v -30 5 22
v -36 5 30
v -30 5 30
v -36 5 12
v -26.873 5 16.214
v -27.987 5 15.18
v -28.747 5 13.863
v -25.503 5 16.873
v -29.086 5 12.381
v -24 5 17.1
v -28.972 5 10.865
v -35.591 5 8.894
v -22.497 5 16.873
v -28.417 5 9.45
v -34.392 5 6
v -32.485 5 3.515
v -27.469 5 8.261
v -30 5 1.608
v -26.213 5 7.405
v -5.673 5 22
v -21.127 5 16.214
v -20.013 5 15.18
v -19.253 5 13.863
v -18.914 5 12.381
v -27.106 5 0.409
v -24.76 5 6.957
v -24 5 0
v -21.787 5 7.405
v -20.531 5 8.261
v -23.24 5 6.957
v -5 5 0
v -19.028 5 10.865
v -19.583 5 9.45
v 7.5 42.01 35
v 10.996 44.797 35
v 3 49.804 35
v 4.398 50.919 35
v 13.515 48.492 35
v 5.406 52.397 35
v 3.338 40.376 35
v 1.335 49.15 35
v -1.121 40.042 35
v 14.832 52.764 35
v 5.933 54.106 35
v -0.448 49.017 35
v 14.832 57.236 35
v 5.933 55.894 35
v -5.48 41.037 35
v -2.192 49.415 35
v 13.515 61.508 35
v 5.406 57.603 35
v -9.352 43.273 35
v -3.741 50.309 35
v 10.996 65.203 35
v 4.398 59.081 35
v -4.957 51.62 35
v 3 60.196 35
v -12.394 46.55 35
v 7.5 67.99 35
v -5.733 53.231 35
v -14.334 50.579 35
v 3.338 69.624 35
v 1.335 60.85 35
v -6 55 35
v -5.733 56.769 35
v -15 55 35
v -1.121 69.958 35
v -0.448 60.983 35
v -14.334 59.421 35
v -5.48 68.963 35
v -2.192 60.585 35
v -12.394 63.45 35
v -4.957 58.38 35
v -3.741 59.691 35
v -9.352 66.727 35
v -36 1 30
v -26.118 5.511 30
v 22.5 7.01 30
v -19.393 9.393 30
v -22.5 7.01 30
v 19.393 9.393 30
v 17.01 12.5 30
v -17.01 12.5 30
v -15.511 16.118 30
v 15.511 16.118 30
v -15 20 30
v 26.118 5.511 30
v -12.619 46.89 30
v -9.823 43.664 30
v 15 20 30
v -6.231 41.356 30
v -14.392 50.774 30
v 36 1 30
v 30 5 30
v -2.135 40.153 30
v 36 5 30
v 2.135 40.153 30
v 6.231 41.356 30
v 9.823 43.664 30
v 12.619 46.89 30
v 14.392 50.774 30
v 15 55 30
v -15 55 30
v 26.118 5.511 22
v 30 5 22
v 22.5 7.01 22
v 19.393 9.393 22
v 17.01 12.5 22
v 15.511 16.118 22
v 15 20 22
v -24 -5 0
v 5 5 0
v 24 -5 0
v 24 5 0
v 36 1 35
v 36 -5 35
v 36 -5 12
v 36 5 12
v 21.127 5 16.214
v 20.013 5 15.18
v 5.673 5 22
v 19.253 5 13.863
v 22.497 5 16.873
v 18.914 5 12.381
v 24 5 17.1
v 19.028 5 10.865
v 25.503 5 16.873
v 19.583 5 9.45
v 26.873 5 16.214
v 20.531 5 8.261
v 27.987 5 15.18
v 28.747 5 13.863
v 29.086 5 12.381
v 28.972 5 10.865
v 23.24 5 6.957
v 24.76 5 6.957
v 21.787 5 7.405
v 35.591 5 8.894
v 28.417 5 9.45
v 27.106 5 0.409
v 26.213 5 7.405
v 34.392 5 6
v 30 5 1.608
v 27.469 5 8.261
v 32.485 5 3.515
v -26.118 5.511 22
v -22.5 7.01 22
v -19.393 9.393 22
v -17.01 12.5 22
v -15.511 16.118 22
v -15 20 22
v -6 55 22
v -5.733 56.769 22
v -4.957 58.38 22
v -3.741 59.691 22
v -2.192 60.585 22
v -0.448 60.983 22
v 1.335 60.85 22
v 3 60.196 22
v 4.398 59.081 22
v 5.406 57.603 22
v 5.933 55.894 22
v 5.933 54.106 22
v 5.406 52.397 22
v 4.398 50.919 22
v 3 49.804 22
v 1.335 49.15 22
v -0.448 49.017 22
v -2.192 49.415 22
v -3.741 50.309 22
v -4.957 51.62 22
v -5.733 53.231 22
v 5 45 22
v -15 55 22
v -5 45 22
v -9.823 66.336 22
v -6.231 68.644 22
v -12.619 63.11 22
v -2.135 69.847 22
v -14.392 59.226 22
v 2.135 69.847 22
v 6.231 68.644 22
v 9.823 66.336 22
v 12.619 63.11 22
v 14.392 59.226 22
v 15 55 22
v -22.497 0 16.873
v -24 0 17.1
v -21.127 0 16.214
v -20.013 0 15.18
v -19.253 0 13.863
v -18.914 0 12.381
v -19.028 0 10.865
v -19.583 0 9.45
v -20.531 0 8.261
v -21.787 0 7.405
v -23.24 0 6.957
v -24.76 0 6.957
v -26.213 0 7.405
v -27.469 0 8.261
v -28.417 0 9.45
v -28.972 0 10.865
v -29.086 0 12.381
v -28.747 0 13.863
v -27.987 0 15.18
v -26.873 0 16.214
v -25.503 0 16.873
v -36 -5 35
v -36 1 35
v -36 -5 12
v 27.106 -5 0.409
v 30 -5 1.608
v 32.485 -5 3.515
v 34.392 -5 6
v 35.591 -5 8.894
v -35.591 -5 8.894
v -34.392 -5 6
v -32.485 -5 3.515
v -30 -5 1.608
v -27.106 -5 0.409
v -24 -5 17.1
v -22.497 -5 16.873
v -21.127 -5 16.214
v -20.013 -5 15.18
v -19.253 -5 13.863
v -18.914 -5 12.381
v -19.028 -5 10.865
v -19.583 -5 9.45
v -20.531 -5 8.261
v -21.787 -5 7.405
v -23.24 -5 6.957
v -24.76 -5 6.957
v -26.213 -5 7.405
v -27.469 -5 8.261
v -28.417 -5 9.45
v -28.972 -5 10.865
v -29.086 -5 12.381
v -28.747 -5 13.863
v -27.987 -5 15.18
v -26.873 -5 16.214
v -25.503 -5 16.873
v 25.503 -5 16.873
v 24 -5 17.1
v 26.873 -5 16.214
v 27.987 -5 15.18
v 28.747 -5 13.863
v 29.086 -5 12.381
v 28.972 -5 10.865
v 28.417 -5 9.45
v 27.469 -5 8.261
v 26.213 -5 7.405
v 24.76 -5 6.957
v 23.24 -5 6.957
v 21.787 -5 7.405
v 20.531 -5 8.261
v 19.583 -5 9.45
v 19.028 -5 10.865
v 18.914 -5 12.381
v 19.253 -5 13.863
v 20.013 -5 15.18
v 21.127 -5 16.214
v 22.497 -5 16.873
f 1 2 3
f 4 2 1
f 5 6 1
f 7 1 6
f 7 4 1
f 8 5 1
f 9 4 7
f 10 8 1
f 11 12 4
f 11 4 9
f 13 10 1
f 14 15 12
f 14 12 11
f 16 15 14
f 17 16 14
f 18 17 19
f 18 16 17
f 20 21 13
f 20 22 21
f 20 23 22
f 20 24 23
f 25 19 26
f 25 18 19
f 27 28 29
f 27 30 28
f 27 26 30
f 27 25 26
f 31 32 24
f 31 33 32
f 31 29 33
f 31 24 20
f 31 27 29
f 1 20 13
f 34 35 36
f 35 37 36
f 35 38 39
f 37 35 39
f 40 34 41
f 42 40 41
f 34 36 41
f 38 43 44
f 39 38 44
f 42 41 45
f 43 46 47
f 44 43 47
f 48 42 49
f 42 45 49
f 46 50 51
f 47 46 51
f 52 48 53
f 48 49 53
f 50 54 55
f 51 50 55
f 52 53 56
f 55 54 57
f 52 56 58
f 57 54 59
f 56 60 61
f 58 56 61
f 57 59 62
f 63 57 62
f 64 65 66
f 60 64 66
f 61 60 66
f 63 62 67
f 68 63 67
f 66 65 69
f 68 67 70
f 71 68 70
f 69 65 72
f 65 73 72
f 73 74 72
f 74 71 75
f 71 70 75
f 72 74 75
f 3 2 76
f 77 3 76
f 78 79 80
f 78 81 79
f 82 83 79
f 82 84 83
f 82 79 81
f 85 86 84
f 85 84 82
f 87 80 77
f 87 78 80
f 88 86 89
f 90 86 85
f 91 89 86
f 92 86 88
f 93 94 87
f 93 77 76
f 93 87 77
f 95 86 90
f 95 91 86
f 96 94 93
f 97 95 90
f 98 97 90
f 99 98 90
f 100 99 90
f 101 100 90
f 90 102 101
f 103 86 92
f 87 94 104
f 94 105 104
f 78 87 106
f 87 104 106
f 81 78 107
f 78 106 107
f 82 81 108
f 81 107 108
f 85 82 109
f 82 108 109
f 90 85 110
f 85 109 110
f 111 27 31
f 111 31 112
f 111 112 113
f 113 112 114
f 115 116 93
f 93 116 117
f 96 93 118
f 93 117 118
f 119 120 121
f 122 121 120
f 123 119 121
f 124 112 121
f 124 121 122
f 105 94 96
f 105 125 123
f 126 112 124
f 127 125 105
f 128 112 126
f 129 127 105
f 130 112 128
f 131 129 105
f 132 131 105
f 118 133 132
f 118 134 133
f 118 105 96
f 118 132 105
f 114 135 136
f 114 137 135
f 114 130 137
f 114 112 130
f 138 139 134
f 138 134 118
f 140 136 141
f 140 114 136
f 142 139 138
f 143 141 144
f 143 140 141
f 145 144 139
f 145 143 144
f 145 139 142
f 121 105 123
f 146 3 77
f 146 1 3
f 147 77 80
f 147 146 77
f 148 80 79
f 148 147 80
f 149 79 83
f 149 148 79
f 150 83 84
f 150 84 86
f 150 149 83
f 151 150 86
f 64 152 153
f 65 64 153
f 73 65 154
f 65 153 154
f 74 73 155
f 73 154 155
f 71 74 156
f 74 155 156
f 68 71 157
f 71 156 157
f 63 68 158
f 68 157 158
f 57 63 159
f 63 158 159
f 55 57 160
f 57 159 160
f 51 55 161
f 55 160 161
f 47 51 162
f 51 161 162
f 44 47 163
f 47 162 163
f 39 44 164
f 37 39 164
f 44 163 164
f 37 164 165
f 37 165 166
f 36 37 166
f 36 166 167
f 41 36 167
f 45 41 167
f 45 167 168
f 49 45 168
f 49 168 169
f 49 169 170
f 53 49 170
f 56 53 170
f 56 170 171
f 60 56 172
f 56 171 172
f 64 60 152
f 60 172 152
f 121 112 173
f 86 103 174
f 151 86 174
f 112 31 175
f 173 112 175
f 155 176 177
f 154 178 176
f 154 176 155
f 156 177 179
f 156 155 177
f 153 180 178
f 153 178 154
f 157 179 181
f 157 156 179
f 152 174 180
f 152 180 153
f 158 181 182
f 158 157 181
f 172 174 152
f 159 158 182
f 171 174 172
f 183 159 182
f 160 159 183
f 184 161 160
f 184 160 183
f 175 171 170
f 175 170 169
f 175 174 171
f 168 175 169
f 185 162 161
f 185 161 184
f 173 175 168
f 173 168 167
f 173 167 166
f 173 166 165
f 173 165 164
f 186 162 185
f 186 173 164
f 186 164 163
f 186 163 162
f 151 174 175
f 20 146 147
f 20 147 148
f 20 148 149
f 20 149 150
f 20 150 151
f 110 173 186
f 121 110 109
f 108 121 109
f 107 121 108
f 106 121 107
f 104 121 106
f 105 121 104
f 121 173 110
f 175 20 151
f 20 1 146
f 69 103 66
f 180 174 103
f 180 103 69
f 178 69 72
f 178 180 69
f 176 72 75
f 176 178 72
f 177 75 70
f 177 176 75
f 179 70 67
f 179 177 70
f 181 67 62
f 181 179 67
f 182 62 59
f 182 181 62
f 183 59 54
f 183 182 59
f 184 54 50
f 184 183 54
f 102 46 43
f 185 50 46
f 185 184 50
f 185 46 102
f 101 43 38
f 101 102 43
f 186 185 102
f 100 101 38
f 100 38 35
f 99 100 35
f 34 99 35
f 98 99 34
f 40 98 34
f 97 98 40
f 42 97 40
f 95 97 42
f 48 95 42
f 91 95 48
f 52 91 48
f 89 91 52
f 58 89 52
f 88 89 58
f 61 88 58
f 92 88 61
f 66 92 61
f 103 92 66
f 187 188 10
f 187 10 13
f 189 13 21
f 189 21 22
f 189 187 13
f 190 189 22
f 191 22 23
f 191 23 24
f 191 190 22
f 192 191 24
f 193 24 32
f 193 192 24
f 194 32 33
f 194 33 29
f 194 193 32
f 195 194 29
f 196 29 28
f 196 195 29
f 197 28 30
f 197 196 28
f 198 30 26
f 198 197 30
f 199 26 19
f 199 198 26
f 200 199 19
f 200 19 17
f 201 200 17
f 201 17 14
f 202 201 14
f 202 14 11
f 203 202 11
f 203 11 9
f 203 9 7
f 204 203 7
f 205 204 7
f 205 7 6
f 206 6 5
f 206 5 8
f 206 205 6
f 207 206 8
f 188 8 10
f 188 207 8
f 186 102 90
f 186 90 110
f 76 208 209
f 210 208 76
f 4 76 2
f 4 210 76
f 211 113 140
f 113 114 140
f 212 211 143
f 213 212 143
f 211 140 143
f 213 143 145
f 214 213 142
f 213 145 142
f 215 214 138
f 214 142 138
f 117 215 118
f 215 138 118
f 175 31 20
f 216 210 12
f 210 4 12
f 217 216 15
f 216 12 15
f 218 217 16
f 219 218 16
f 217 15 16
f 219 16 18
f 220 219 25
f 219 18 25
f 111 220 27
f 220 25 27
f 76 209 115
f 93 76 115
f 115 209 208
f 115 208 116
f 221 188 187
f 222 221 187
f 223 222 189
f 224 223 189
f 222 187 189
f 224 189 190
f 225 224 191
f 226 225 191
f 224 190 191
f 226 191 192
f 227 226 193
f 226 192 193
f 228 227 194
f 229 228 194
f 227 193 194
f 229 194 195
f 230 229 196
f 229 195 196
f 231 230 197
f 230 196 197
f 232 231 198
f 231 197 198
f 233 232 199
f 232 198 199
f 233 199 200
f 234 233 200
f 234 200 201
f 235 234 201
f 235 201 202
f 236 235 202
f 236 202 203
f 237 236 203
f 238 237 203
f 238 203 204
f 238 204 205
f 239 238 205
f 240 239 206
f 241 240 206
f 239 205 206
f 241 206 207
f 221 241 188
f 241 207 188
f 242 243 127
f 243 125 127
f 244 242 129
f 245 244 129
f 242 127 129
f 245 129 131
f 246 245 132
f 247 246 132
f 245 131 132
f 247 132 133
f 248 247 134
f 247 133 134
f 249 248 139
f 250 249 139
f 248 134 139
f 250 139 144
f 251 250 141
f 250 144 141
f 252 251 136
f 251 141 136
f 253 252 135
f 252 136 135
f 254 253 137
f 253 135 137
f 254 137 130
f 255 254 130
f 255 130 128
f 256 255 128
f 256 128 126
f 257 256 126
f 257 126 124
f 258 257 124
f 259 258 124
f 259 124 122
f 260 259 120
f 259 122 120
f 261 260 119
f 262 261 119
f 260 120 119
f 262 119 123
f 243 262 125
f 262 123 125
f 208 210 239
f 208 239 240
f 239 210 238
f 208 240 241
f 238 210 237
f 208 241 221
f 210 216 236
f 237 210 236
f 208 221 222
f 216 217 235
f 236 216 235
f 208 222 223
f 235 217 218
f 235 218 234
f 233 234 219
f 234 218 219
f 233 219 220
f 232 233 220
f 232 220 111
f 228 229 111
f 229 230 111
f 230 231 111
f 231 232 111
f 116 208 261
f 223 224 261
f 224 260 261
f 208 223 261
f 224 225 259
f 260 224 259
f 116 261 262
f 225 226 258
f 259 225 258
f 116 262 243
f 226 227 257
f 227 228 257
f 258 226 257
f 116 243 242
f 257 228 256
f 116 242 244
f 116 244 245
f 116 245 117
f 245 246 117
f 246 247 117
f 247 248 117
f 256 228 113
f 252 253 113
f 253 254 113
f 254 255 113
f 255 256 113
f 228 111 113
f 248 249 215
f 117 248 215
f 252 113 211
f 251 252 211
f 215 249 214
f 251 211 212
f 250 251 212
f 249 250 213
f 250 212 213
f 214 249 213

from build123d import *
from build123d.topology import SkipClean

# Parameters (mm, degrees)
SKETCH1_W           = 72
SKETCH1_H           = 10
BOSS_EXTRUDE1_DEPTH = 35
SKETCH2_W           = 72
SKETCH2_H           = 4
CUT_EXTRUDE1_DEPTH  = 5
SKETCH3_W           = 30
SKETCH3_H           = 8
BOSS_EXTRUDE3_DEPTH = 50
SKETCH5_R           = 15
SKETCH5_R_2         = 6
EXTRUDE_THIN1_DEPTH = 13
CUT_EXTRUDE2_START  = -13
CUT_EXTRUDE2_DEPTH  = 13
FILLET2_R           = 15
RIB12_REACH         = 88.145
SKETCH7_WALL_W      = 219.941301276
SKETCH7_WALL_H      = 10
RIB12_DRAFT_ANGLE   = 2
FILLET3_R           = 12
SKETCH9_R           = 5.1
CUT_EXTRUDE5_DEPTH  = 5


with BuildPart() as part:
    # Sketch1 → Boss-Extrude1 (new body)
    with BuildSketch(Plane.XY):
        Rectangle(SKETCH1_W, SKETCH1_H)
    extrude(amount=BOSS_EXTRUDE1_DEPTH)

    # Sketch2 → Cut-Extrude1 (cut)
    with BuildSketch(Plane.XY.offset(35)):
        with Locations((0, 3)):
            Rectangle(SKETCH2_W, SKETCH2_H)
    extrude(amount=-CUT_EXTRUDE1_DEPTH, mode=Mode.SUBTRACT)

    # Sketch3 → Boss-Extrude3 (add)
    with BuildSketch(Plane(origin=(0, 5, 0), x_dir=(1, 0, 0), z_dir=(0, 1, 0))):
        with Locations((0, -26)):
            Rectangle(SKETCH3_W, SKETCH3_H)
    extrude(amount=BOSS_EXTRUDE3_DEPTH)

    # Sketch5 → Extrude-Thin1 (add)
    with BuildSketch(Plane(origin=(0, 0, 22), x_dir=(-1, 0, 0), z_dir=(0, 0, -1))):
        with Locations((0, 55)):
            Circle(SKETCH5_R)
        with Locations((0, 55)):
            Circle(SKETCH5_R_2, mode=Mode.SUBTRACT)
    extrude(amount=-EXTRUDE_THIN1_DEPTH)

    # Sketch6 → Cut-Extrude2 (cut)
    with SkipClean():  # the faces are left unmerged after this step: merging them gives an invalid solid
        with BuildSketch(Plane.XY.offset(30).offset(CUT_EXTRUDE2_START)):
            with BuildLine():
                Line((6, 55), (-6, 55))
                ThreePointArc((-6, 55), (0, 49), (6, 55))
            make_face()
        extrude(amount=CUT_EXTRUDE2_DEPTH, mode=Mode.SUBTRACT)

    # Fillet2
    fillet2_edges = [part.edges().sort_by_distance(p)[0] for p in [
        (-15, 5, 26),
        (15, 5, 26),
    ]]
    fillet(fillet2_edges, radius=FILLET2_R)

    # Sketch7 wall → Rib12 (add, up to next)
    with BuildSketch(Plane(origin=(0, 25, 11), x_dir=(0, 0.876215908677, 0.481918749772), z_dir=(0, -0.481918749772, 0.876215908677)), mode=Mode.PRIVATE) as rib12_sk1:
        Rectangle(SKETCH7_WALL_W, SKETCH7_WALL_H)
    rib12_tool1 = extrude(rib12_sk1.sketch, amount=RIB12_REACH, mode=Mode.PRIVATE) - part.part
    add(rib12_tool1.solids().sort_by_distance((0, 25, 11))[0])

    # Rib12 draft
    rib12_draft_faces = [part.faces().sort_by_distance(p)[0] for p in [
        (-5, 24.759040625, 11.438107954),
        (5, 24.759040625, 11.438107954),
    ]]
    draft(rib12_draft_faces, Plane(origin=(0, 25, 11), x_dir=(0, 0.876215908677, 0.481918749772), z_dir=(0, 0.481918749772, -0.876215908677)), RIB12_DRAFT_ANGLE)

    # Fillet3
    fillet3_edges = [part.edges().sort_by_distance(p)[0] for p in [
        (-36, 0, 0),
        (36, 0, 0),
    ]]
    fillet(fillet3_edges, radius=FILLET3_R)

    # Sketch9 → Cut-Extrude5 (cut, symmetric)
    with SkipClean():  # the faces are left unmerged after this step: merging them gives an invalid solid
        with BuildSketch(Plane(origin=(0, 0, 0), x_dir=(1, 0, 0), z_dir=(0, 1, 0))):
            with Locations(Location((-24, -12, 0), (0, 0, 270))):
                Circle(SKETCH9_R)
            with Locations(Location((24, -12, 0), (0, 0, 270))):
                Circle(SKETCH9_R)
        extrude(amount=CUT_EXTRUDE5_DEPTH, both=True, mode=Mode.SUBTRACT)


solid = part.part
